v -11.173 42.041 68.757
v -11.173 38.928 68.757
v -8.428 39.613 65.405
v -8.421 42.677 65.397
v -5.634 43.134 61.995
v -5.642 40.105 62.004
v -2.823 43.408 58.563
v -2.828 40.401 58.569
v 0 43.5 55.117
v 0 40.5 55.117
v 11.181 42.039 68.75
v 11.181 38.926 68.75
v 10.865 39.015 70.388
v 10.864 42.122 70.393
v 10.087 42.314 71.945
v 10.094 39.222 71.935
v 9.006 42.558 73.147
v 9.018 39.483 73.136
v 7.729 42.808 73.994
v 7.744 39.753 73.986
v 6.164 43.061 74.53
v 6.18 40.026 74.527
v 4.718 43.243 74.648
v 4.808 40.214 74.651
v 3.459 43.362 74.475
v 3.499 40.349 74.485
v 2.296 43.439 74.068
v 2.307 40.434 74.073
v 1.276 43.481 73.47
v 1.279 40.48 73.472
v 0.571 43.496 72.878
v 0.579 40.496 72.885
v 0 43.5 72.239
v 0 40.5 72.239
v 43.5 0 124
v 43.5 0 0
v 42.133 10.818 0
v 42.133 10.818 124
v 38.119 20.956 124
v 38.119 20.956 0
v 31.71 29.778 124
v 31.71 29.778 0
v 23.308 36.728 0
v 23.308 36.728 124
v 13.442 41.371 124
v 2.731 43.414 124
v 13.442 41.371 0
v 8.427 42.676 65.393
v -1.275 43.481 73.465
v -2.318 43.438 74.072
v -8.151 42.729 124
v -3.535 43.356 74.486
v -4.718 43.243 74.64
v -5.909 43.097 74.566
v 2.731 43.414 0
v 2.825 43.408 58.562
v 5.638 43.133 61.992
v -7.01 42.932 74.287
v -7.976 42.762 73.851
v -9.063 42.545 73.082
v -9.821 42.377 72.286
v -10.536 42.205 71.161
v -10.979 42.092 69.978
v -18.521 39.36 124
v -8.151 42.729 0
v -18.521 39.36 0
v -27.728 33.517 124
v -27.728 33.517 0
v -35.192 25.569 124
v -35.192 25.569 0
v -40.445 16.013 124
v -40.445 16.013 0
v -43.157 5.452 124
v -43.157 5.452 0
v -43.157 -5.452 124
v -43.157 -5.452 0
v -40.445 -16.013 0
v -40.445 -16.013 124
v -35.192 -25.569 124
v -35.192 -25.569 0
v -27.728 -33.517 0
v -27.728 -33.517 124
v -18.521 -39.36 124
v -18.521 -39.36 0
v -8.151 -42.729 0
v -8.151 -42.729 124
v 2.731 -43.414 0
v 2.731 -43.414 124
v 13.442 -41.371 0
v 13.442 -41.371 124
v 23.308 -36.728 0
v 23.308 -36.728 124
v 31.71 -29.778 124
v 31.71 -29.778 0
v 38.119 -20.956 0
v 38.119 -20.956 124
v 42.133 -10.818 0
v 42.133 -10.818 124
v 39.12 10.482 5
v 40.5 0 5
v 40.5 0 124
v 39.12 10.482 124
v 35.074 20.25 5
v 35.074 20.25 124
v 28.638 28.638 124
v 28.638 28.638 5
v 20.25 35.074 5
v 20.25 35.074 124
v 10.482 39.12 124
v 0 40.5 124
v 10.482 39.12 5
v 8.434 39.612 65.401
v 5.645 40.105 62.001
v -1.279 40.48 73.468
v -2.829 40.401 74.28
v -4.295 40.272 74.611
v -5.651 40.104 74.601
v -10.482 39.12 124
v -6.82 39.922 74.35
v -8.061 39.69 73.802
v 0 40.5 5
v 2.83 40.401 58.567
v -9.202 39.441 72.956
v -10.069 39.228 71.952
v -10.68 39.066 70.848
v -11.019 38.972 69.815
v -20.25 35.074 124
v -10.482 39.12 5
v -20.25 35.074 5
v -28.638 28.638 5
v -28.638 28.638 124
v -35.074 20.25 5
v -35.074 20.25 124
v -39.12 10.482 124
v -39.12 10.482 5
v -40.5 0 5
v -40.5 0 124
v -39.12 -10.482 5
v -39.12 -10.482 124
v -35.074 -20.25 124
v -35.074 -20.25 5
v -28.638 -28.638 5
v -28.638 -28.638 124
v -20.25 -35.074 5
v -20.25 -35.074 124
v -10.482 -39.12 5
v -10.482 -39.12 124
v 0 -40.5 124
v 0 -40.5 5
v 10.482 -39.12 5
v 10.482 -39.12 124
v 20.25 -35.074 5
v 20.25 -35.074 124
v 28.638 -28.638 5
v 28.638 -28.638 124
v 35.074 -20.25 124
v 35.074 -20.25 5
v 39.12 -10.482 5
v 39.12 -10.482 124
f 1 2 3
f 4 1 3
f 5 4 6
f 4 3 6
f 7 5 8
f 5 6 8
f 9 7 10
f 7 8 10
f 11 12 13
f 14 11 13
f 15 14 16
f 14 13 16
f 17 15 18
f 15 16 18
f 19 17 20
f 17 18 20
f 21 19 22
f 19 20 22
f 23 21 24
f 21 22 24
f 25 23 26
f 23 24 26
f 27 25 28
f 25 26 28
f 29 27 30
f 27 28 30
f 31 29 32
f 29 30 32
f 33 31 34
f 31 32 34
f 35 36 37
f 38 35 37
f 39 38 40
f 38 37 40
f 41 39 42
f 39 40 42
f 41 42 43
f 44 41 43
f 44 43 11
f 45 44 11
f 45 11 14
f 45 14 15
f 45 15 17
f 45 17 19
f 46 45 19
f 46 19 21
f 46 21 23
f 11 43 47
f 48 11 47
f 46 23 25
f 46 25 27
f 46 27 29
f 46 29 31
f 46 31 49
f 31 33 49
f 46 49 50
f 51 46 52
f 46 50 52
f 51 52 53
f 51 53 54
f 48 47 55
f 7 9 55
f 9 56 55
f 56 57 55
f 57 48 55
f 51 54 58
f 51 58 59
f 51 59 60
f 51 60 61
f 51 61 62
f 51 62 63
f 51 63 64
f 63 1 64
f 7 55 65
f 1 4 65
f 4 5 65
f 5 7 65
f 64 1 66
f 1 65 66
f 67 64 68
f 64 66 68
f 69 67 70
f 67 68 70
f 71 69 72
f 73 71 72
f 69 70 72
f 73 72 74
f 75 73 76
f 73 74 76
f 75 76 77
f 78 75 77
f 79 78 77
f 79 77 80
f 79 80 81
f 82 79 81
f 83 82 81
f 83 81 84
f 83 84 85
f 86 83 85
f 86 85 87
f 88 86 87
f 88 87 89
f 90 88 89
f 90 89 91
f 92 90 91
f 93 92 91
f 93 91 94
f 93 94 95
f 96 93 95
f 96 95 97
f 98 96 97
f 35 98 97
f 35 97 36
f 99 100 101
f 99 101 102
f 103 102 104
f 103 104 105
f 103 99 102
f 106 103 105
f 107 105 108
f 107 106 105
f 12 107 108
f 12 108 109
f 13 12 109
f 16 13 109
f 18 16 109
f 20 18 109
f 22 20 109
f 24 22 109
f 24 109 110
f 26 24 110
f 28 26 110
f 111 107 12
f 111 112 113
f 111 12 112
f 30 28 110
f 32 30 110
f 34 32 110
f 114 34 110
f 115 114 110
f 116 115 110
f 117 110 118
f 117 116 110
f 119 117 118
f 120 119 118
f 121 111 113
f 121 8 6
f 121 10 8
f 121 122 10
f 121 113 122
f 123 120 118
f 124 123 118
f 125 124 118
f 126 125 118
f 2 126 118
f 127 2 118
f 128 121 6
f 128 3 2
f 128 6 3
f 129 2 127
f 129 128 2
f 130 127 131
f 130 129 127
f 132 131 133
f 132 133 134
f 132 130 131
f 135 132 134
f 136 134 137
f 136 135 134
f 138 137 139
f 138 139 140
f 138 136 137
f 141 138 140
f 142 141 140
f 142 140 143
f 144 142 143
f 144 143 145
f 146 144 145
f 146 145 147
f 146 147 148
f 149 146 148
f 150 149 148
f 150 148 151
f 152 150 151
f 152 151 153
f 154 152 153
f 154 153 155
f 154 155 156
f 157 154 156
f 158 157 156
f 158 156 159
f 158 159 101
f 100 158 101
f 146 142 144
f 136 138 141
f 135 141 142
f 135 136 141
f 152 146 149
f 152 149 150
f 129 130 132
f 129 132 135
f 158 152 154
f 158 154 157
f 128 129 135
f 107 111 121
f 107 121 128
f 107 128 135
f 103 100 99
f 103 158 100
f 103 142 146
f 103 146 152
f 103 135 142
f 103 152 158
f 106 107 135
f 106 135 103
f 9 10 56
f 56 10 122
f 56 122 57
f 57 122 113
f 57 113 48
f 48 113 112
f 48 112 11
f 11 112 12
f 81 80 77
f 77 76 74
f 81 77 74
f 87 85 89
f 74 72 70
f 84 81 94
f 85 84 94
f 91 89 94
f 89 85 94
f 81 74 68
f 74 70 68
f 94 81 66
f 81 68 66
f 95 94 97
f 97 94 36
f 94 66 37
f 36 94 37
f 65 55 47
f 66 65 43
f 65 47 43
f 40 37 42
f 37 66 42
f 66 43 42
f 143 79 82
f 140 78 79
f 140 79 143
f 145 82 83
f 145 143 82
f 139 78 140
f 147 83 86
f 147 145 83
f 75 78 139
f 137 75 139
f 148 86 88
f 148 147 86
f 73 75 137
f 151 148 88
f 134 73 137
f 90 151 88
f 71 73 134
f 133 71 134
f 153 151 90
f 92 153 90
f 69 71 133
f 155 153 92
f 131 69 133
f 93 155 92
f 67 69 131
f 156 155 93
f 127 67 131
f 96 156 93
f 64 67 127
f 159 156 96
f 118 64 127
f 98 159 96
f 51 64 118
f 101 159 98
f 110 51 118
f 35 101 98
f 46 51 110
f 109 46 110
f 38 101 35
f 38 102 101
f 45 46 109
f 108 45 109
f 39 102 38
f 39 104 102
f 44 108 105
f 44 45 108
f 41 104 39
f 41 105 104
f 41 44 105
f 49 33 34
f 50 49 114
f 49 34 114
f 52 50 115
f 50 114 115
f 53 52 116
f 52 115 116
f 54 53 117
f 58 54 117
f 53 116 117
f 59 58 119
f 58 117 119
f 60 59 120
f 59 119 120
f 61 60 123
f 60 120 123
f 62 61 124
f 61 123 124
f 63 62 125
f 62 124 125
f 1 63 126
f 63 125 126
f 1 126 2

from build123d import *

# Parameters (mm, degrees)
F0_R     = 43.5
F0_R_2   = 40.5
F1_DEPTH = 124
F2_DEPTH = 5
F4_DEPTH = 43.501


with BuildPart() as f1:
    # F0 (on Top) → F1 (new body)
    with BuildSketch(Plane.XY):
        Circle(F0_R)
        Circle(F0_R_2, mode=Mode.SUBTRACT)
    extrude(amount=F1_DEPTH)

    # F0 (on Top) → F2 (join)
    with BuildSketch(Plane.XY):
        Circle(F0_R_2)
    extrude(amount=F2_DEPTH)

    # F3 (on Front) → F4 (cut, through all)
    with BuildSketch(Plane.XZ):
        with BuildLine():
            Line((-11.173021, 68.756767), (0, 55.116978))
            Line((0, 55.116978), (11.180688, 68.750483))
            ThreePointArc((11.180688, 68.750483), (6.798893, 74.367971), (0, 72.239272))
            ThreePointArc((0, 72.239272), (-6.790198, 74.359844), (-11.173021, 68.756767))
        make_face()
    extrude(amount=-F4_DEPTH, mode=Mode.SUBTRACT)


solid = f1.part
